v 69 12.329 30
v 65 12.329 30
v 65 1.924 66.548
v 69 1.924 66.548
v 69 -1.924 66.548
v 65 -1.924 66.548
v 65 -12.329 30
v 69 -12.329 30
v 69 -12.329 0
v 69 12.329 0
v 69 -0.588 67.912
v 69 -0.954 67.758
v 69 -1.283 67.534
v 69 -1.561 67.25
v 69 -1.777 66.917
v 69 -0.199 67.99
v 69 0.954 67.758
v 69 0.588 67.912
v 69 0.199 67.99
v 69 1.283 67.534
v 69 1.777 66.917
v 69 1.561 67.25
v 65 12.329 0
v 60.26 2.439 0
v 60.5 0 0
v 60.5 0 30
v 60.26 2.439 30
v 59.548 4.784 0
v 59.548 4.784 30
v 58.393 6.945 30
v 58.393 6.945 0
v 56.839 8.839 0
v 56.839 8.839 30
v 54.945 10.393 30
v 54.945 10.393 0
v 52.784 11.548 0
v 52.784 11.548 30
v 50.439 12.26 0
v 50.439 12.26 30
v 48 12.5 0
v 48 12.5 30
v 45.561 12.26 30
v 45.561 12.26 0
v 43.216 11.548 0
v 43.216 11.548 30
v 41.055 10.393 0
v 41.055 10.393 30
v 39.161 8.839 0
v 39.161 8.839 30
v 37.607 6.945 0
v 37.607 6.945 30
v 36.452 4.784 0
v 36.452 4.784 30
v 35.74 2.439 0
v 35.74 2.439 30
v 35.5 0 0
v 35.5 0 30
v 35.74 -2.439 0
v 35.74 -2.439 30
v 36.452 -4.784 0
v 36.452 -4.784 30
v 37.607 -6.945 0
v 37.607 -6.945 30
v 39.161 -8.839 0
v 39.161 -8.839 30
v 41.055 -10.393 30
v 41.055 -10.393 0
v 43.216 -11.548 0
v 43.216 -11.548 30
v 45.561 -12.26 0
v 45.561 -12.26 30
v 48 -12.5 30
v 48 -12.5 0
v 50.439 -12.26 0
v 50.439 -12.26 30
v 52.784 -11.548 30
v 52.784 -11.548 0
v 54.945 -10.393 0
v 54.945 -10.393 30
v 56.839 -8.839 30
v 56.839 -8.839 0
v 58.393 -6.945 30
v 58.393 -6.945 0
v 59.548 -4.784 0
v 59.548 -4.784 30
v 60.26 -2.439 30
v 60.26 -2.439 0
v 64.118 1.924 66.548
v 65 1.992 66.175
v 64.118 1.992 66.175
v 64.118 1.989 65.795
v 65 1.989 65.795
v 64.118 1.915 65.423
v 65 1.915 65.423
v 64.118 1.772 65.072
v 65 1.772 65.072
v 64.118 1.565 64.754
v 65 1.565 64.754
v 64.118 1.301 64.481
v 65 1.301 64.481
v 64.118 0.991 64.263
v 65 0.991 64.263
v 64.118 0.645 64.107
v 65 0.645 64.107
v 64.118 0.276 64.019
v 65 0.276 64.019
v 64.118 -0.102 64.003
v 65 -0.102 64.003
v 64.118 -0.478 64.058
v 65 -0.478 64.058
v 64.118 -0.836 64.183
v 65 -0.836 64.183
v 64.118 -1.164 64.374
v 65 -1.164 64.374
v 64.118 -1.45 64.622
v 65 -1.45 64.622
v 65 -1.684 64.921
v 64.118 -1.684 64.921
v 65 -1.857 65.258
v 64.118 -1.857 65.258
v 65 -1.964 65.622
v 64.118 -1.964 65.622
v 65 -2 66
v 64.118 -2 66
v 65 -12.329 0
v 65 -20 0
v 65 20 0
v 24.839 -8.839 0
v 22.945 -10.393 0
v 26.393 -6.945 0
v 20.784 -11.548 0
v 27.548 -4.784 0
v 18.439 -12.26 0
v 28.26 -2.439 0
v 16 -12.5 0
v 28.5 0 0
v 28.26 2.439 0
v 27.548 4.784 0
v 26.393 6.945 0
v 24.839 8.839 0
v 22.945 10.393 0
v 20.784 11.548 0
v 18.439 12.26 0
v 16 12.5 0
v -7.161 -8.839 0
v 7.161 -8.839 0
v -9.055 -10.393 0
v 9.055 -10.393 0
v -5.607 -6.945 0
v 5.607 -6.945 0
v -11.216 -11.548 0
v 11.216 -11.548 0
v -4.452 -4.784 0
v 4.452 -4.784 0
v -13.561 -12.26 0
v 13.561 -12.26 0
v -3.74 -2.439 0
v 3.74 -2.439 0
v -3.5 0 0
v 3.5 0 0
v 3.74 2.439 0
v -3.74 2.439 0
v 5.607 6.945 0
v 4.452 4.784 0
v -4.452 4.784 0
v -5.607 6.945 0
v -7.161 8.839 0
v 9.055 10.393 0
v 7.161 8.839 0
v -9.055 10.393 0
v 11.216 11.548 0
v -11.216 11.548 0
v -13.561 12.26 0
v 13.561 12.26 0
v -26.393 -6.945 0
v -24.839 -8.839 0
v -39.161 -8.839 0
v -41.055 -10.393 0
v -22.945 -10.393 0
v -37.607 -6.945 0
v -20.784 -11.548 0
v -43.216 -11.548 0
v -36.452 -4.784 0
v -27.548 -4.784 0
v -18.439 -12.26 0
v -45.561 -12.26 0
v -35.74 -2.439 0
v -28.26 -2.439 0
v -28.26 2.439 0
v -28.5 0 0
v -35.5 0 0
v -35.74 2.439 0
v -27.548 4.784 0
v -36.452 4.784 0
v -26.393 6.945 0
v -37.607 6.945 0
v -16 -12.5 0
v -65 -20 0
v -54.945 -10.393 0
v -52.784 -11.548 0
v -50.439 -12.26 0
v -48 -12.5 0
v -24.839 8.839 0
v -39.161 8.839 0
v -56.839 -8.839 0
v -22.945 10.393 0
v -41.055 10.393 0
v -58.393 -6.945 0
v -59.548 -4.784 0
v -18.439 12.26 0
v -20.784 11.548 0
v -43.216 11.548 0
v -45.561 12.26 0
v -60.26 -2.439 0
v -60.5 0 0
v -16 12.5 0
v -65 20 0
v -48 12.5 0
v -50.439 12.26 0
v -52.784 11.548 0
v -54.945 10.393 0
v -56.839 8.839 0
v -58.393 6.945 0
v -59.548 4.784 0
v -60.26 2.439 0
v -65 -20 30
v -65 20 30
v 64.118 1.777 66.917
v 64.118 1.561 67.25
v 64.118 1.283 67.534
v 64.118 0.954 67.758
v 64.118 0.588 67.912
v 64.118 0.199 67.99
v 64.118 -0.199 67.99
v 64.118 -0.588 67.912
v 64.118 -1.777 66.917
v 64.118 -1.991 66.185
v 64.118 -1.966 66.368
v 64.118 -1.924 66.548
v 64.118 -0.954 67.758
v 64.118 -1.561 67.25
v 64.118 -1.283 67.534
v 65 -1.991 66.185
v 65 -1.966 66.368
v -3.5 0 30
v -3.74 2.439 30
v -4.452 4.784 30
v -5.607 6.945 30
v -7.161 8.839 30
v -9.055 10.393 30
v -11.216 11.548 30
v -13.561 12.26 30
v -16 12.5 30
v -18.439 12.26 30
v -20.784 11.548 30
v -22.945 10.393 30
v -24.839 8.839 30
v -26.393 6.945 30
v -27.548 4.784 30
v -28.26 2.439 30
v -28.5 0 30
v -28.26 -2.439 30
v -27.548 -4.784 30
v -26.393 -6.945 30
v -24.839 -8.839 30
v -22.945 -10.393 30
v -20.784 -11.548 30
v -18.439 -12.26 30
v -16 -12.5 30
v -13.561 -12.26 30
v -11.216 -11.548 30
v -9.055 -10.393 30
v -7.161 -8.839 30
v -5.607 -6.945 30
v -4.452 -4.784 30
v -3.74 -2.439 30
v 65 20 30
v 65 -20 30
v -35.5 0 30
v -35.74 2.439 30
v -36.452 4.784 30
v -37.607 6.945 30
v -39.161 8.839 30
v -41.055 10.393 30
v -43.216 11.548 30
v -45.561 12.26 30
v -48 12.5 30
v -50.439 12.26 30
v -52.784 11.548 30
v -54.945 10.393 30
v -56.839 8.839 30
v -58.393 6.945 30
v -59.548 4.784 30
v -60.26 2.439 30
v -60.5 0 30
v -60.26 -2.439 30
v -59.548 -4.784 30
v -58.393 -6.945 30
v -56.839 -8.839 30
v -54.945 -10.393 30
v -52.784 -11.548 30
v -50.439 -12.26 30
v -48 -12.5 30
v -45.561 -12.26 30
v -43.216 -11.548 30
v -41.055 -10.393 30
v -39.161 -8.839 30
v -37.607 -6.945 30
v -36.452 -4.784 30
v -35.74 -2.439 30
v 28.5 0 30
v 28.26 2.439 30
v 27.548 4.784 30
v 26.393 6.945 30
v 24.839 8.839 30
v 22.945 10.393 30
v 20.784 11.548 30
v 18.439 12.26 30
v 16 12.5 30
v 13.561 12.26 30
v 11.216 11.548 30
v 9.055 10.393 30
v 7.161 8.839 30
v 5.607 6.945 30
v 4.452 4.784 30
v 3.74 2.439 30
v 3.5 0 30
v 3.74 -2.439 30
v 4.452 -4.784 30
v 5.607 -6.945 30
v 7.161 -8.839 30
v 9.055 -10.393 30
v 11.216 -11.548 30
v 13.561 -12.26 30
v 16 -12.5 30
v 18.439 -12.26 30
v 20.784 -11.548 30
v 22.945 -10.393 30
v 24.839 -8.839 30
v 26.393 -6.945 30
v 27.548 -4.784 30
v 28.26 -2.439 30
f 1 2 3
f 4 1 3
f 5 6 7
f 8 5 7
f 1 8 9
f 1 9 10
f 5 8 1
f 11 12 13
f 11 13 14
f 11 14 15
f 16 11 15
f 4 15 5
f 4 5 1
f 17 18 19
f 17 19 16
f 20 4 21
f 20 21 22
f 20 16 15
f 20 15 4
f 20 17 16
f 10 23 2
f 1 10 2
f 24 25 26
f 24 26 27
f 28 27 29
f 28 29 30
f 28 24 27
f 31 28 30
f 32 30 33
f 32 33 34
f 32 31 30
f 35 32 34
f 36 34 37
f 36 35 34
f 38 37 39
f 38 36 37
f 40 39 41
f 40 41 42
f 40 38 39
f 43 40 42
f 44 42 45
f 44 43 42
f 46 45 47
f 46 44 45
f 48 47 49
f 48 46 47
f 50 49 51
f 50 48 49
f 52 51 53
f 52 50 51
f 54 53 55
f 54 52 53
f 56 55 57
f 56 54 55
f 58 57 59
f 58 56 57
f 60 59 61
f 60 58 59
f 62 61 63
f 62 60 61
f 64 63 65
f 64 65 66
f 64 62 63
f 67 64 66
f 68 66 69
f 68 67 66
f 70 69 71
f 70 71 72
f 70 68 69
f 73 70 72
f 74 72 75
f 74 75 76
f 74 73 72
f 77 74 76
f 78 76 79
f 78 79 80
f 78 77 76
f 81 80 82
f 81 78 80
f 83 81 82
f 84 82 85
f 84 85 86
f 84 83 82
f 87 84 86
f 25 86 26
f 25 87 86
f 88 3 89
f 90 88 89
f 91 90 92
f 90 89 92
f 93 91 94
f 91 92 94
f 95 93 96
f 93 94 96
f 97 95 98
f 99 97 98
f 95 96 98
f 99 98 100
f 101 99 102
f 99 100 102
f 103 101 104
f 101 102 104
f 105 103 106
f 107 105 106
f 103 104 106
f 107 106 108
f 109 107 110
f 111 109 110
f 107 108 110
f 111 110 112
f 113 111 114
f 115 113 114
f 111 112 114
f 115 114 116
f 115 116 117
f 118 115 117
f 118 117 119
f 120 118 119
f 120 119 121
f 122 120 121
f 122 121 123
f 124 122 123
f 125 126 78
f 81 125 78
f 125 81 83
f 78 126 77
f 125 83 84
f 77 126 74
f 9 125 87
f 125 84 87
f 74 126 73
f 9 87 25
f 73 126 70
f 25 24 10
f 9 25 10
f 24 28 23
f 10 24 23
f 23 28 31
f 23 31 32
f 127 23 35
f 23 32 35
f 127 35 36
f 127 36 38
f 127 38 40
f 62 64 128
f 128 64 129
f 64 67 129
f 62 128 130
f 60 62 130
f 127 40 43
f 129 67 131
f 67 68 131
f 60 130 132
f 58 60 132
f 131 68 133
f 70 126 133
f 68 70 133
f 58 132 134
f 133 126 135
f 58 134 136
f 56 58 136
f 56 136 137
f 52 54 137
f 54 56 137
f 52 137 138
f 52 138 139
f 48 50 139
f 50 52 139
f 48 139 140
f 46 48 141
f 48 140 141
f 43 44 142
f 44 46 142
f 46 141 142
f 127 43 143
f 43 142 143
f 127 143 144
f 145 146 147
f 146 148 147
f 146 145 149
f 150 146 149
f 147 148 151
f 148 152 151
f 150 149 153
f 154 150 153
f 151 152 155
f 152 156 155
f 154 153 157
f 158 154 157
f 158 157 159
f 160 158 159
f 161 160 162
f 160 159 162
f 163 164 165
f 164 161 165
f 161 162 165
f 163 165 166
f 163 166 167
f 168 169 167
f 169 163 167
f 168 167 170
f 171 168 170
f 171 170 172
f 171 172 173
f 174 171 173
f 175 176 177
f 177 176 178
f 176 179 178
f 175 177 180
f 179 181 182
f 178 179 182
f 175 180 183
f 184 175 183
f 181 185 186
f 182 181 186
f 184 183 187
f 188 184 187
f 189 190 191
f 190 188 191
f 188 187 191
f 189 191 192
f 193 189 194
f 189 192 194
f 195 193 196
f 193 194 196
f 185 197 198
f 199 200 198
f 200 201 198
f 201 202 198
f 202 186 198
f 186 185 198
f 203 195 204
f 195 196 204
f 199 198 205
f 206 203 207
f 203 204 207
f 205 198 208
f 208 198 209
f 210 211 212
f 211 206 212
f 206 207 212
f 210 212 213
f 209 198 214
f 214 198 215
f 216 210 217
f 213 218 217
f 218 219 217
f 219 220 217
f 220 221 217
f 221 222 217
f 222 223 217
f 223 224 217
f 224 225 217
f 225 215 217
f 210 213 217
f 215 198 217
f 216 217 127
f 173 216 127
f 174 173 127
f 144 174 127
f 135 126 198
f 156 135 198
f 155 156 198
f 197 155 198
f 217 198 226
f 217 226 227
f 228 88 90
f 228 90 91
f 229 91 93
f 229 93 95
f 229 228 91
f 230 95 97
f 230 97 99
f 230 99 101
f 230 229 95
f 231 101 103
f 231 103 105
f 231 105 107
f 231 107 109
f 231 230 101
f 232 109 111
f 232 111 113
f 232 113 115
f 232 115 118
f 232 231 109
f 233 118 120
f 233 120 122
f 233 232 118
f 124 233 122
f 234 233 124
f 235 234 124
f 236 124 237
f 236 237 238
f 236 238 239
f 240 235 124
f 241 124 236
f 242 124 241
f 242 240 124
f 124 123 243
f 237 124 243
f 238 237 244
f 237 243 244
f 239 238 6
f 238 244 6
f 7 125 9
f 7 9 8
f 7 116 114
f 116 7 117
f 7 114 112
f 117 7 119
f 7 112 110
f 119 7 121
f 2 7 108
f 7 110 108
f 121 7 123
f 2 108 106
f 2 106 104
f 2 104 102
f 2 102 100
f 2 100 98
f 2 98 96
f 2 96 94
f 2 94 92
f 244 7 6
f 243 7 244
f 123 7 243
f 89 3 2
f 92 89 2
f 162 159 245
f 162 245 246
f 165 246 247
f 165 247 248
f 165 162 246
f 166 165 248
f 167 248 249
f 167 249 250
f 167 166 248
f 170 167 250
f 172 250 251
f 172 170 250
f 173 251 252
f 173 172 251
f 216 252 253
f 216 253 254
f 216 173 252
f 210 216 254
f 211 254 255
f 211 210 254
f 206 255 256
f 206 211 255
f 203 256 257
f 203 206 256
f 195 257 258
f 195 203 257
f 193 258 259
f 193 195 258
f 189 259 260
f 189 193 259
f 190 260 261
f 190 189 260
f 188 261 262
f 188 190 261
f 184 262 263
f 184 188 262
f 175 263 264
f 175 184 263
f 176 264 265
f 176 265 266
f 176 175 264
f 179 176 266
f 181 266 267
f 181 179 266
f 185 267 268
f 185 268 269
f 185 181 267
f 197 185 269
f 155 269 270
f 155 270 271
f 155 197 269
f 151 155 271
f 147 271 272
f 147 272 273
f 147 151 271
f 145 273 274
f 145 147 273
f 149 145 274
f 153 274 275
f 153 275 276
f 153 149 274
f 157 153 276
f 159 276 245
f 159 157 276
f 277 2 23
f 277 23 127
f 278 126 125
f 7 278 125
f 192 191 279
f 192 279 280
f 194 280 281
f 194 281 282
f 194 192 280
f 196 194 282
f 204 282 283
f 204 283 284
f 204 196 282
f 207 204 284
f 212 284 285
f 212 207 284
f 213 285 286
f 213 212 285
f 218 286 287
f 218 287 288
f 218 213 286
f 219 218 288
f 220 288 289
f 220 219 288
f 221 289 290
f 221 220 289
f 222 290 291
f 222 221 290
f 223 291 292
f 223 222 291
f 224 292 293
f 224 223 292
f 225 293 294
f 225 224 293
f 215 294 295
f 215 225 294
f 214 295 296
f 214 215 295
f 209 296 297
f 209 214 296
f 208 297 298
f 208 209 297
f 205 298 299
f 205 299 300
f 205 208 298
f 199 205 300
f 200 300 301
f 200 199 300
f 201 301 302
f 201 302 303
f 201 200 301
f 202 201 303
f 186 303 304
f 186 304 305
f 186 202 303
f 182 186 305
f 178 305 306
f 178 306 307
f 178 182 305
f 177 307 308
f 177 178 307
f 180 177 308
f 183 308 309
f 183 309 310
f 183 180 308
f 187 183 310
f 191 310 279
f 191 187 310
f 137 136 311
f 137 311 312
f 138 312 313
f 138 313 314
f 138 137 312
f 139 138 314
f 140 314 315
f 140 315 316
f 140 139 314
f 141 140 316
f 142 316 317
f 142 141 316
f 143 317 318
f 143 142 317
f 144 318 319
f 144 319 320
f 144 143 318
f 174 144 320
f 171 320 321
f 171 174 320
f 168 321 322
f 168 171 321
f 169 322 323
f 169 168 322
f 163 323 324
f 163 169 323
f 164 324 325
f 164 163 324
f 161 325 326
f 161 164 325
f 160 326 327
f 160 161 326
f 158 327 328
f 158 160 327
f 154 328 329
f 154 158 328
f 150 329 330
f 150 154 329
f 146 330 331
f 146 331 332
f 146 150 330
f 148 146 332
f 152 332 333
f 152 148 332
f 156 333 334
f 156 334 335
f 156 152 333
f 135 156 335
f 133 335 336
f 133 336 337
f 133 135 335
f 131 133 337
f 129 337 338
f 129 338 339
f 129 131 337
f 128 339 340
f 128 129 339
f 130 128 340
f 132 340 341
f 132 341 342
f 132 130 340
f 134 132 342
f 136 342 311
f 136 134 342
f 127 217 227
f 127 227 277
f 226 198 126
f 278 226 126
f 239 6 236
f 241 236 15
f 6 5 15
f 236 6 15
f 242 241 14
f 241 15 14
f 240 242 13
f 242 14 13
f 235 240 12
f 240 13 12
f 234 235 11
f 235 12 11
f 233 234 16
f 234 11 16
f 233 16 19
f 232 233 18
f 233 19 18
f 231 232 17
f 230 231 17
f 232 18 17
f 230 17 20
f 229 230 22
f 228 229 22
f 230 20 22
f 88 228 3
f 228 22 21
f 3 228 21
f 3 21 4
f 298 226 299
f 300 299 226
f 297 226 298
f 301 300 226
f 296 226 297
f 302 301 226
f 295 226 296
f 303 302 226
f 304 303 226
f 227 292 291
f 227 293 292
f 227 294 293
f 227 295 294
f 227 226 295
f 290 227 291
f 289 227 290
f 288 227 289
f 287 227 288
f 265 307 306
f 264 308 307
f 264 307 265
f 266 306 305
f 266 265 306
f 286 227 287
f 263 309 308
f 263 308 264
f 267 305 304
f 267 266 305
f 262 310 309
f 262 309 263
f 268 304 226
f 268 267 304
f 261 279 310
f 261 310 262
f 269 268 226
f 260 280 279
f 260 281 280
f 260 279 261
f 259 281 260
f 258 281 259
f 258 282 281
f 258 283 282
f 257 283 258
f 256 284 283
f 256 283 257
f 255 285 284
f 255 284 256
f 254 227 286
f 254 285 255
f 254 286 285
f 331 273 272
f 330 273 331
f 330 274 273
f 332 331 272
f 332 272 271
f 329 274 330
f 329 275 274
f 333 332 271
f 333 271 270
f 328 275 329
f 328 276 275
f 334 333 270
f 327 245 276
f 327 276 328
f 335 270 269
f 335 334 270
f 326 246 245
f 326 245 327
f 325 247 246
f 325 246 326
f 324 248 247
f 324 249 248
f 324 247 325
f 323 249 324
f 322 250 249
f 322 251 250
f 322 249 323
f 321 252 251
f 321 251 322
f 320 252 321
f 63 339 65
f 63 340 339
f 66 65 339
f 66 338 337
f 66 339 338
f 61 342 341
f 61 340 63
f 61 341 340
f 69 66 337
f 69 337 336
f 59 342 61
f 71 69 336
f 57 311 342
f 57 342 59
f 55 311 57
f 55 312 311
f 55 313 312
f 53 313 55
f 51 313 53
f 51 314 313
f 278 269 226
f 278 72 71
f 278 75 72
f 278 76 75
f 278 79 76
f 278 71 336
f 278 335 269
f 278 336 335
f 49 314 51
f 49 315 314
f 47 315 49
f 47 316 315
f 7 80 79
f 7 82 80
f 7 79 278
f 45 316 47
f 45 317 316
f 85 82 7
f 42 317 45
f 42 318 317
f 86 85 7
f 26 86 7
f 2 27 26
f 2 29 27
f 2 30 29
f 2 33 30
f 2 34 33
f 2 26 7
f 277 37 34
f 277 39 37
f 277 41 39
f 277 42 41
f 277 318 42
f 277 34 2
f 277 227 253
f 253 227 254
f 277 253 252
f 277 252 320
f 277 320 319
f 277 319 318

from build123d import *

# Parameters (mm, degrees)
F0_W     = 130
F0_H     = 40
F0_R     = 12.5
F1_DEPTH = 30
F2_W     = 12.3288280059
F2_H     = 30
F3_DEPTH = 4
F4_DEPTH = 4
F6_DEPTH = 0.88206


with BuildPart() as f1:
    # F0 (on Top) → F1 (new body)
    with BuildSketch(Plane.XY):
        Rectangle(F0_W, F0_H)
        with Locations((-48, 0)):
            Circle(F0_R, mode=Mode.SUBTRACT)
        with Locations((-16, 0)):
            Circle(F0_R, mode=Mode.SUBTRACT)
        with Locations((16, 0)):
            Circle(F0_R, mode=Mode.SUBTRACT)
        with Locations((48, 0)):
            Circle(F0_R, mode=Mode.SUBTRACT)
    extrude(amount=F1_DEPTH)

    # F2 (on face) → F3 (join)
    with BuildSketch(Plane.YZ.offset(65)):
        with BuildLine():
            Line((-12.3288280059, 30), (0, 30))
            Line((0, 30), (0, 64))
            ThreePointArc((0, 64), (-1.5961346024, 64.7948633558), (-1.9235602984, 66.5476456688))
            Line((-1.9235602984, 66.5476456688), (-12.3288280059, 30))
        make_face()
        with BuildLine():
            Line((0, 64), (0, 30))
            Line((0, 30), (12.3288280059, 30))
            Line((12.3288280059, 30), (1.9235602984, 66.5476456688))
            ThreePointArc((1.9235602984, 66.5476456688), (1.9807978944, 66.2764773076), (2, 66))
            ThreePointArc((2, 66), (1.4142135624, 64.5857864376), (0, 64))
        make_face()
        with Locations((6.164414003, 15)):
            Rectangle(F2_W, F2_H)
        with Locations((-6.164414003, 15)):
            Rectangle(F2_W, F2_H)
    extrude(amount=F3_DEPTH)

    # F2 (on face) → F4 (join)
    with BuildSketch(Plane.YZ.offset(65)):
        with BuildLine():
            Line((0, 0), (0, 30))
            Line((0, 30), (0, 64))
            ThreePointArc((0, 64), (-1.5961346024, 64.7948633558), (-1.9235602984, 66.5476456688))
            Line((-1.9235602984, 66.5476456688), (-12.3288280059, 30))
            Line((-12.3288280059, 30), (-12.3288280059, 0))
            Line((-12.3288280059, 0), (0, 0))
        make_face()
        with BuildLine():
            Line((0, 64), (0, 30))
            Line((0, 30), (0, 0))
            Line((0, 0), (12.3288280059, 0))
            Line((12.3288280059, 0), (12.3288280059, 30))
            Line((12.3288280059, 30), (1.9235602984, 66.5476456688))
            ThreePointArc((1.9235602984, 66.5476456688), (1.9807978944, 66.2764773076), (2, 66))
            ThreePointArc((2, 66), (1.4142135624, 64.5857864376), (0, 64))
        make_face()
        with BuildLine():
            ThreePointArc((-1.9235602984, 66.5476456688), (-1.5961346024, 64.7948633558), (0, 64))
            ThreePointArc((0, 64), (1.4142135624, 64.5857864376), (2, 66))
            ThreePointArc((2, 66), (1.9807978944, 66.2764773076), (1.9235602984, 66.5476456688))
            ThreePointArc((1.9235602984, 66.5476456688), (0, 68), (-1.9235602984, 66.5476456688))
        make_face()
    extrude(amount=F4_DEPTH)

    # F5 (on face) → F6 (join)
    with BuildSketch(Plane(origin=(65, 0, 0), x_dir=(0, -1, 0), z_dir=(-1, 0, 0))):
        with BuildLine():
            ThreePointArc((-1.9235602984, 66.5476456688), (-0.2764773076, 64.0192021056), (2, 66))
            ThreePointArc((2, 66), (1.9807978944, 66.2764773076), (1.9235602984, 66.5476456688))
            ThreePointArc((1.9235602984, 66.5476456688), (0, 68), (-1.9235602984, 66.5476456688))
        make_face()
    extrude(amount=F6_DEPTH)


solid = f1.part
